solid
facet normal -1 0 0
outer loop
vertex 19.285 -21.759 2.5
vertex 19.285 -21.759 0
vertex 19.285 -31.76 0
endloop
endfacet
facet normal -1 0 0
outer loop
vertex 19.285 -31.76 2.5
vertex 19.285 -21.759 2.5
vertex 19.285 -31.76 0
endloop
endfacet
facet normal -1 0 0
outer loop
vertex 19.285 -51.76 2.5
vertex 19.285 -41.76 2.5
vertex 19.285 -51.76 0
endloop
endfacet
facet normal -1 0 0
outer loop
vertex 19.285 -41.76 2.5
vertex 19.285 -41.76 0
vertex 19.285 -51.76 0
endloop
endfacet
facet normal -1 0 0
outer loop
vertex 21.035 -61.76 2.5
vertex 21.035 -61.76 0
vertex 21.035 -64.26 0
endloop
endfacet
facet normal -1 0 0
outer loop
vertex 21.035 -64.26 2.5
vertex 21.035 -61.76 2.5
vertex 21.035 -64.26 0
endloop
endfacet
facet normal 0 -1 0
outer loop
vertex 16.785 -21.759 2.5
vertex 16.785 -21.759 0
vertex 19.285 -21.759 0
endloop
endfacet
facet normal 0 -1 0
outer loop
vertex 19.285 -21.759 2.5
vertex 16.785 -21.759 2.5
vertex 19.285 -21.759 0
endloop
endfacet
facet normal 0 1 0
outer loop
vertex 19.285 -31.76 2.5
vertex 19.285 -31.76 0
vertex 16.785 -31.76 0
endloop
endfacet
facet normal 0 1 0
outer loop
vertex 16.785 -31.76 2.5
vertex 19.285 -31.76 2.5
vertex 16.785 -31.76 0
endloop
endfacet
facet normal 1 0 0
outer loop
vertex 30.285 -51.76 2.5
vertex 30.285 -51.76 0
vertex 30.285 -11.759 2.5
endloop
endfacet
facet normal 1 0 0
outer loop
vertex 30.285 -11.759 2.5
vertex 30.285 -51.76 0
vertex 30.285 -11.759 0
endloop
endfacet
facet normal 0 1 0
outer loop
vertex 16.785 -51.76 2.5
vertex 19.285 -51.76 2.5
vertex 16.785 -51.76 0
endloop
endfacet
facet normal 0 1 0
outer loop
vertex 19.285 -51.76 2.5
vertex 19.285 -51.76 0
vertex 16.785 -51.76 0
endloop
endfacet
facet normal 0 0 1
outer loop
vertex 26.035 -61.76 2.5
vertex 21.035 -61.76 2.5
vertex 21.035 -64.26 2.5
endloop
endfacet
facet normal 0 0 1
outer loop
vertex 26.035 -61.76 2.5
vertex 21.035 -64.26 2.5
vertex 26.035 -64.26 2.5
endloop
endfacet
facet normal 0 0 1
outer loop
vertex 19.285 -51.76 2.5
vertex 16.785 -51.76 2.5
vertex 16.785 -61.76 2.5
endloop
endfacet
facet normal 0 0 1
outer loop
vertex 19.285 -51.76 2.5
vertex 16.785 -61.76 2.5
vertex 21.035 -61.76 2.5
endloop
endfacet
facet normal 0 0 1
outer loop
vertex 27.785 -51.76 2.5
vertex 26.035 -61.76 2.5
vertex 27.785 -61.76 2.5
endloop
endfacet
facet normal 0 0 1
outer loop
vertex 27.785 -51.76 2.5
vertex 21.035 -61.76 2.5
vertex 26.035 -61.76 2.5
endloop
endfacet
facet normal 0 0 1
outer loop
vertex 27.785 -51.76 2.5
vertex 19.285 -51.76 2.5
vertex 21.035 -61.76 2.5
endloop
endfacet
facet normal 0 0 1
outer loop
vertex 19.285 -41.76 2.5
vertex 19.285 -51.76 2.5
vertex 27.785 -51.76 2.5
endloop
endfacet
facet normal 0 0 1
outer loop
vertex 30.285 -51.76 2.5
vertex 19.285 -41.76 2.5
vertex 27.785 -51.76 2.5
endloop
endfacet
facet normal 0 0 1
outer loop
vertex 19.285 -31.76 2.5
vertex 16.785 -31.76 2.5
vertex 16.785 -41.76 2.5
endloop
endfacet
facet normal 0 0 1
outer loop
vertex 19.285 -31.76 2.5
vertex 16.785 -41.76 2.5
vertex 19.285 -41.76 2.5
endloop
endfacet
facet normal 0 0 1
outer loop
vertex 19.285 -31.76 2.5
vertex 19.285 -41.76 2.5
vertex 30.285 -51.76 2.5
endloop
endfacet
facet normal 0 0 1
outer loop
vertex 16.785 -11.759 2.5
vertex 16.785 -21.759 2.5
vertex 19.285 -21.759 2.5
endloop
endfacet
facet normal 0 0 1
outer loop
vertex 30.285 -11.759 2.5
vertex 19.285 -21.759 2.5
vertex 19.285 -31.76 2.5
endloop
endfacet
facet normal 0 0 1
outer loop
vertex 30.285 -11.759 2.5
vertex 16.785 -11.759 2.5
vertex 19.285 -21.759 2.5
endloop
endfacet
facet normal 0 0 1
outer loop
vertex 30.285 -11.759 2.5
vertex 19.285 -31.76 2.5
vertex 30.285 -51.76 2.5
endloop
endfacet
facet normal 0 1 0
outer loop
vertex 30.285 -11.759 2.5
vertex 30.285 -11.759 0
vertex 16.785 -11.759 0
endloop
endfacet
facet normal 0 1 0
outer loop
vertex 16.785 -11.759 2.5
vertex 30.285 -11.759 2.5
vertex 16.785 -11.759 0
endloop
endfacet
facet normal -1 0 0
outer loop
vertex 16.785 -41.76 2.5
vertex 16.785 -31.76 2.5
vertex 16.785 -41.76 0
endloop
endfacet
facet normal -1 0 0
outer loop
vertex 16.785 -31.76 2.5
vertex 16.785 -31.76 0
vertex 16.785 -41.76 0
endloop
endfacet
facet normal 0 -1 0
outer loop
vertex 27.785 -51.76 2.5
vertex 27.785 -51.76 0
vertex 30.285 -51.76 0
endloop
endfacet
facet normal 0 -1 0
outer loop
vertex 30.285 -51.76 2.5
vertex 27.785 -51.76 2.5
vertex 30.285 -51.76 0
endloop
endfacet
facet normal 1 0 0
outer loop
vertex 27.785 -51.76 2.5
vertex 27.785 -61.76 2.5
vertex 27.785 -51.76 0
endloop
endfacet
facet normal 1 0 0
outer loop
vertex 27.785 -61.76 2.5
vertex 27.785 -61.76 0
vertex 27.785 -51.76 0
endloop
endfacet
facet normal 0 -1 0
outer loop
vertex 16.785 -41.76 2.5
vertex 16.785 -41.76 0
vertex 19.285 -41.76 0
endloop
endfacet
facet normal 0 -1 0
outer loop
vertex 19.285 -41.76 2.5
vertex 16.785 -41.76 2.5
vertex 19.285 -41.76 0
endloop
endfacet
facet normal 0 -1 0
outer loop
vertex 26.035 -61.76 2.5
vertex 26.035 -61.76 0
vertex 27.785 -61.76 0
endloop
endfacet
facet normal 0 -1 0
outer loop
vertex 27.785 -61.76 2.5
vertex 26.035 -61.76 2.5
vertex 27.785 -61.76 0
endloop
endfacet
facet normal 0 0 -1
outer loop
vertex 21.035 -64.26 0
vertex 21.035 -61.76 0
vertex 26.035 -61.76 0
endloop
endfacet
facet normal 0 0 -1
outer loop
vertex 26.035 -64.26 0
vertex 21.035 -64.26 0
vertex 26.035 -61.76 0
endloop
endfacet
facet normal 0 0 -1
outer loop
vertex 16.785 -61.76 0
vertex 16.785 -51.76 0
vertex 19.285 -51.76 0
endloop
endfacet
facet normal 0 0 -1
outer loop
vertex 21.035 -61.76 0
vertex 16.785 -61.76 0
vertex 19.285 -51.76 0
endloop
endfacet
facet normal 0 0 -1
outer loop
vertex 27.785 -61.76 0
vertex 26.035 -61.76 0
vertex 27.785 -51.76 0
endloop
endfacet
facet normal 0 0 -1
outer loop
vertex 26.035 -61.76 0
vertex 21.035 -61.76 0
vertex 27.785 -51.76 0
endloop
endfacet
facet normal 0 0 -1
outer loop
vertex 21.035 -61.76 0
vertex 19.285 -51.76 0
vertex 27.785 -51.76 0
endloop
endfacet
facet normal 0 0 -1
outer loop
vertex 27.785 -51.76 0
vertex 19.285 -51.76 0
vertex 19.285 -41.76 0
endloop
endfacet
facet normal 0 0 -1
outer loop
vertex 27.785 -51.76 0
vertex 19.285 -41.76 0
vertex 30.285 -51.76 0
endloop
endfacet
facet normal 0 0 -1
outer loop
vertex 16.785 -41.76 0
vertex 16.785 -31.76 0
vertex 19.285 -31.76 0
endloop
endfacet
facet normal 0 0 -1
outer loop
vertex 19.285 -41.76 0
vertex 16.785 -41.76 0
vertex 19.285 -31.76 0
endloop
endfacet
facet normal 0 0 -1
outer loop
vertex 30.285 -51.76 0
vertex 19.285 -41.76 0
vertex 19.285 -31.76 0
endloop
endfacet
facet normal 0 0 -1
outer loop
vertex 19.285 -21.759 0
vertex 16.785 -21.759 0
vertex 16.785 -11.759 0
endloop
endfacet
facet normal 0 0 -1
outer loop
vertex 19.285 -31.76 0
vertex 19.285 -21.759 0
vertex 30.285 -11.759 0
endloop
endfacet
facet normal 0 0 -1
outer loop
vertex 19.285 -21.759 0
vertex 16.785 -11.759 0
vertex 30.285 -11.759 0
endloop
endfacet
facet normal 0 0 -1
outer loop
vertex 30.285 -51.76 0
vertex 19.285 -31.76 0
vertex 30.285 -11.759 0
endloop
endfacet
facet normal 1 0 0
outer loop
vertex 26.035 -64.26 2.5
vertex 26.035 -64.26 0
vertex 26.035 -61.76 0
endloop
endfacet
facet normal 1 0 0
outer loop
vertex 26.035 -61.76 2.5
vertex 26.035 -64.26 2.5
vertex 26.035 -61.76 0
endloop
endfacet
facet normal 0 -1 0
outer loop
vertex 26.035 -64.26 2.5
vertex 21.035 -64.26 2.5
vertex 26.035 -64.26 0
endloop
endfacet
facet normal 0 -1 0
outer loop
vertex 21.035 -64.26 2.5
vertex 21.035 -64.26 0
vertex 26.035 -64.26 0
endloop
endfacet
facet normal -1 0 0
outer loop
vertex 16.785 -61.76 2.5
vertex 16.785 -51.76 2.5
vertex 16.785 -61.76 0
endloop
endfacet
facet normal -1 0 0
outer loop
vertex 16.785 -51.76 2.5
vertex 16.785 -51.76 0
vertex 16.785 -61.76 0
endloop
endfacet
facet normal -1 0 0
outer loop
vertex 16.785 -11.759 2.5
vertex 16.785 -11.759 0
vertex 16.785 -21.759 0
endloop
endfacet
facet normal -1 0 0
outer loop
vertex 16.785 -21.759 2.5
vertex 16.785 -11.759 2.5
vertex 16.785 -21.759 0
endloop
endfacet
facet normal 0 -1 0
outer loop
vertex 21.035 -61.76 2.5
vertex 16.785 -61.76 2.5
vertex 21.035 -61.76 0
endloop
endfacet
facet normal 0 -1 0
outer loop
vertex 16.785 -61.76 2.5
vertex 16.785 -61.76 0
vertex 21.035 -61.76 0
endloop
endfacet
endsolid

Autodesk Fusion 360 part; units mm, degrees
sketch "スケッチ1" plane through (0, 0, 0) normal (0, 0, 1) x (1, 0, 0)
  line L0 (19.2851, -21.7594) -> (19.2851, -31.7595)
  line L1 (19.2851, -31.7595) -> (16.7852, -31.7595)
  line L2 (16.7852, -21.7594) -> (19.2851, -21.7594)
  line L3 (16.7852, -41.7596) -> (19.2851, -41.7596)
  line L4 (16.7852, -31.7595) -> (16.7852, -41.7596)
  line L5 (16.7852, -11.7593) -> (16.7852, -21.7594)
  line L6 (21.0353, -61.7598) -> (21.0353, -64.2597)
  line L7 (19.2851, -41.7596) -> (19.2851, -51.7597)
  line L8 (30.2852, -11.7593) -> (16.7852, -11.7593)
  line L9 (21.0353, -64.2597) -> (26.0353, -64.2597)
  line L10 (27.7852, -51.7597) -> (30.2852, -51.7597)
  line L11 (26.0353, -61.7598) -> (27.7852, -61.7598)
  line L12 (16.7852, -51.7597) -> (16.7852, -61.7598)
  line L13 (16.7852, -61.7598) -> (21.0353, -61.7598)
  line L14 (19.2851, -51.7597) -> (16.7852, -51.7597)
  line L15 (26.0353, -64.2597) -> (26.0353, -61.7598)
  line L16 (27.7852, -61.7598) -> (27.7852, -51.7597)
  line L17 (30.2852, -51.7597) -> (30.2852, -11.7593)
extrude "押し出し1" add sketch "スケッチ1" along normal blind 2.5
